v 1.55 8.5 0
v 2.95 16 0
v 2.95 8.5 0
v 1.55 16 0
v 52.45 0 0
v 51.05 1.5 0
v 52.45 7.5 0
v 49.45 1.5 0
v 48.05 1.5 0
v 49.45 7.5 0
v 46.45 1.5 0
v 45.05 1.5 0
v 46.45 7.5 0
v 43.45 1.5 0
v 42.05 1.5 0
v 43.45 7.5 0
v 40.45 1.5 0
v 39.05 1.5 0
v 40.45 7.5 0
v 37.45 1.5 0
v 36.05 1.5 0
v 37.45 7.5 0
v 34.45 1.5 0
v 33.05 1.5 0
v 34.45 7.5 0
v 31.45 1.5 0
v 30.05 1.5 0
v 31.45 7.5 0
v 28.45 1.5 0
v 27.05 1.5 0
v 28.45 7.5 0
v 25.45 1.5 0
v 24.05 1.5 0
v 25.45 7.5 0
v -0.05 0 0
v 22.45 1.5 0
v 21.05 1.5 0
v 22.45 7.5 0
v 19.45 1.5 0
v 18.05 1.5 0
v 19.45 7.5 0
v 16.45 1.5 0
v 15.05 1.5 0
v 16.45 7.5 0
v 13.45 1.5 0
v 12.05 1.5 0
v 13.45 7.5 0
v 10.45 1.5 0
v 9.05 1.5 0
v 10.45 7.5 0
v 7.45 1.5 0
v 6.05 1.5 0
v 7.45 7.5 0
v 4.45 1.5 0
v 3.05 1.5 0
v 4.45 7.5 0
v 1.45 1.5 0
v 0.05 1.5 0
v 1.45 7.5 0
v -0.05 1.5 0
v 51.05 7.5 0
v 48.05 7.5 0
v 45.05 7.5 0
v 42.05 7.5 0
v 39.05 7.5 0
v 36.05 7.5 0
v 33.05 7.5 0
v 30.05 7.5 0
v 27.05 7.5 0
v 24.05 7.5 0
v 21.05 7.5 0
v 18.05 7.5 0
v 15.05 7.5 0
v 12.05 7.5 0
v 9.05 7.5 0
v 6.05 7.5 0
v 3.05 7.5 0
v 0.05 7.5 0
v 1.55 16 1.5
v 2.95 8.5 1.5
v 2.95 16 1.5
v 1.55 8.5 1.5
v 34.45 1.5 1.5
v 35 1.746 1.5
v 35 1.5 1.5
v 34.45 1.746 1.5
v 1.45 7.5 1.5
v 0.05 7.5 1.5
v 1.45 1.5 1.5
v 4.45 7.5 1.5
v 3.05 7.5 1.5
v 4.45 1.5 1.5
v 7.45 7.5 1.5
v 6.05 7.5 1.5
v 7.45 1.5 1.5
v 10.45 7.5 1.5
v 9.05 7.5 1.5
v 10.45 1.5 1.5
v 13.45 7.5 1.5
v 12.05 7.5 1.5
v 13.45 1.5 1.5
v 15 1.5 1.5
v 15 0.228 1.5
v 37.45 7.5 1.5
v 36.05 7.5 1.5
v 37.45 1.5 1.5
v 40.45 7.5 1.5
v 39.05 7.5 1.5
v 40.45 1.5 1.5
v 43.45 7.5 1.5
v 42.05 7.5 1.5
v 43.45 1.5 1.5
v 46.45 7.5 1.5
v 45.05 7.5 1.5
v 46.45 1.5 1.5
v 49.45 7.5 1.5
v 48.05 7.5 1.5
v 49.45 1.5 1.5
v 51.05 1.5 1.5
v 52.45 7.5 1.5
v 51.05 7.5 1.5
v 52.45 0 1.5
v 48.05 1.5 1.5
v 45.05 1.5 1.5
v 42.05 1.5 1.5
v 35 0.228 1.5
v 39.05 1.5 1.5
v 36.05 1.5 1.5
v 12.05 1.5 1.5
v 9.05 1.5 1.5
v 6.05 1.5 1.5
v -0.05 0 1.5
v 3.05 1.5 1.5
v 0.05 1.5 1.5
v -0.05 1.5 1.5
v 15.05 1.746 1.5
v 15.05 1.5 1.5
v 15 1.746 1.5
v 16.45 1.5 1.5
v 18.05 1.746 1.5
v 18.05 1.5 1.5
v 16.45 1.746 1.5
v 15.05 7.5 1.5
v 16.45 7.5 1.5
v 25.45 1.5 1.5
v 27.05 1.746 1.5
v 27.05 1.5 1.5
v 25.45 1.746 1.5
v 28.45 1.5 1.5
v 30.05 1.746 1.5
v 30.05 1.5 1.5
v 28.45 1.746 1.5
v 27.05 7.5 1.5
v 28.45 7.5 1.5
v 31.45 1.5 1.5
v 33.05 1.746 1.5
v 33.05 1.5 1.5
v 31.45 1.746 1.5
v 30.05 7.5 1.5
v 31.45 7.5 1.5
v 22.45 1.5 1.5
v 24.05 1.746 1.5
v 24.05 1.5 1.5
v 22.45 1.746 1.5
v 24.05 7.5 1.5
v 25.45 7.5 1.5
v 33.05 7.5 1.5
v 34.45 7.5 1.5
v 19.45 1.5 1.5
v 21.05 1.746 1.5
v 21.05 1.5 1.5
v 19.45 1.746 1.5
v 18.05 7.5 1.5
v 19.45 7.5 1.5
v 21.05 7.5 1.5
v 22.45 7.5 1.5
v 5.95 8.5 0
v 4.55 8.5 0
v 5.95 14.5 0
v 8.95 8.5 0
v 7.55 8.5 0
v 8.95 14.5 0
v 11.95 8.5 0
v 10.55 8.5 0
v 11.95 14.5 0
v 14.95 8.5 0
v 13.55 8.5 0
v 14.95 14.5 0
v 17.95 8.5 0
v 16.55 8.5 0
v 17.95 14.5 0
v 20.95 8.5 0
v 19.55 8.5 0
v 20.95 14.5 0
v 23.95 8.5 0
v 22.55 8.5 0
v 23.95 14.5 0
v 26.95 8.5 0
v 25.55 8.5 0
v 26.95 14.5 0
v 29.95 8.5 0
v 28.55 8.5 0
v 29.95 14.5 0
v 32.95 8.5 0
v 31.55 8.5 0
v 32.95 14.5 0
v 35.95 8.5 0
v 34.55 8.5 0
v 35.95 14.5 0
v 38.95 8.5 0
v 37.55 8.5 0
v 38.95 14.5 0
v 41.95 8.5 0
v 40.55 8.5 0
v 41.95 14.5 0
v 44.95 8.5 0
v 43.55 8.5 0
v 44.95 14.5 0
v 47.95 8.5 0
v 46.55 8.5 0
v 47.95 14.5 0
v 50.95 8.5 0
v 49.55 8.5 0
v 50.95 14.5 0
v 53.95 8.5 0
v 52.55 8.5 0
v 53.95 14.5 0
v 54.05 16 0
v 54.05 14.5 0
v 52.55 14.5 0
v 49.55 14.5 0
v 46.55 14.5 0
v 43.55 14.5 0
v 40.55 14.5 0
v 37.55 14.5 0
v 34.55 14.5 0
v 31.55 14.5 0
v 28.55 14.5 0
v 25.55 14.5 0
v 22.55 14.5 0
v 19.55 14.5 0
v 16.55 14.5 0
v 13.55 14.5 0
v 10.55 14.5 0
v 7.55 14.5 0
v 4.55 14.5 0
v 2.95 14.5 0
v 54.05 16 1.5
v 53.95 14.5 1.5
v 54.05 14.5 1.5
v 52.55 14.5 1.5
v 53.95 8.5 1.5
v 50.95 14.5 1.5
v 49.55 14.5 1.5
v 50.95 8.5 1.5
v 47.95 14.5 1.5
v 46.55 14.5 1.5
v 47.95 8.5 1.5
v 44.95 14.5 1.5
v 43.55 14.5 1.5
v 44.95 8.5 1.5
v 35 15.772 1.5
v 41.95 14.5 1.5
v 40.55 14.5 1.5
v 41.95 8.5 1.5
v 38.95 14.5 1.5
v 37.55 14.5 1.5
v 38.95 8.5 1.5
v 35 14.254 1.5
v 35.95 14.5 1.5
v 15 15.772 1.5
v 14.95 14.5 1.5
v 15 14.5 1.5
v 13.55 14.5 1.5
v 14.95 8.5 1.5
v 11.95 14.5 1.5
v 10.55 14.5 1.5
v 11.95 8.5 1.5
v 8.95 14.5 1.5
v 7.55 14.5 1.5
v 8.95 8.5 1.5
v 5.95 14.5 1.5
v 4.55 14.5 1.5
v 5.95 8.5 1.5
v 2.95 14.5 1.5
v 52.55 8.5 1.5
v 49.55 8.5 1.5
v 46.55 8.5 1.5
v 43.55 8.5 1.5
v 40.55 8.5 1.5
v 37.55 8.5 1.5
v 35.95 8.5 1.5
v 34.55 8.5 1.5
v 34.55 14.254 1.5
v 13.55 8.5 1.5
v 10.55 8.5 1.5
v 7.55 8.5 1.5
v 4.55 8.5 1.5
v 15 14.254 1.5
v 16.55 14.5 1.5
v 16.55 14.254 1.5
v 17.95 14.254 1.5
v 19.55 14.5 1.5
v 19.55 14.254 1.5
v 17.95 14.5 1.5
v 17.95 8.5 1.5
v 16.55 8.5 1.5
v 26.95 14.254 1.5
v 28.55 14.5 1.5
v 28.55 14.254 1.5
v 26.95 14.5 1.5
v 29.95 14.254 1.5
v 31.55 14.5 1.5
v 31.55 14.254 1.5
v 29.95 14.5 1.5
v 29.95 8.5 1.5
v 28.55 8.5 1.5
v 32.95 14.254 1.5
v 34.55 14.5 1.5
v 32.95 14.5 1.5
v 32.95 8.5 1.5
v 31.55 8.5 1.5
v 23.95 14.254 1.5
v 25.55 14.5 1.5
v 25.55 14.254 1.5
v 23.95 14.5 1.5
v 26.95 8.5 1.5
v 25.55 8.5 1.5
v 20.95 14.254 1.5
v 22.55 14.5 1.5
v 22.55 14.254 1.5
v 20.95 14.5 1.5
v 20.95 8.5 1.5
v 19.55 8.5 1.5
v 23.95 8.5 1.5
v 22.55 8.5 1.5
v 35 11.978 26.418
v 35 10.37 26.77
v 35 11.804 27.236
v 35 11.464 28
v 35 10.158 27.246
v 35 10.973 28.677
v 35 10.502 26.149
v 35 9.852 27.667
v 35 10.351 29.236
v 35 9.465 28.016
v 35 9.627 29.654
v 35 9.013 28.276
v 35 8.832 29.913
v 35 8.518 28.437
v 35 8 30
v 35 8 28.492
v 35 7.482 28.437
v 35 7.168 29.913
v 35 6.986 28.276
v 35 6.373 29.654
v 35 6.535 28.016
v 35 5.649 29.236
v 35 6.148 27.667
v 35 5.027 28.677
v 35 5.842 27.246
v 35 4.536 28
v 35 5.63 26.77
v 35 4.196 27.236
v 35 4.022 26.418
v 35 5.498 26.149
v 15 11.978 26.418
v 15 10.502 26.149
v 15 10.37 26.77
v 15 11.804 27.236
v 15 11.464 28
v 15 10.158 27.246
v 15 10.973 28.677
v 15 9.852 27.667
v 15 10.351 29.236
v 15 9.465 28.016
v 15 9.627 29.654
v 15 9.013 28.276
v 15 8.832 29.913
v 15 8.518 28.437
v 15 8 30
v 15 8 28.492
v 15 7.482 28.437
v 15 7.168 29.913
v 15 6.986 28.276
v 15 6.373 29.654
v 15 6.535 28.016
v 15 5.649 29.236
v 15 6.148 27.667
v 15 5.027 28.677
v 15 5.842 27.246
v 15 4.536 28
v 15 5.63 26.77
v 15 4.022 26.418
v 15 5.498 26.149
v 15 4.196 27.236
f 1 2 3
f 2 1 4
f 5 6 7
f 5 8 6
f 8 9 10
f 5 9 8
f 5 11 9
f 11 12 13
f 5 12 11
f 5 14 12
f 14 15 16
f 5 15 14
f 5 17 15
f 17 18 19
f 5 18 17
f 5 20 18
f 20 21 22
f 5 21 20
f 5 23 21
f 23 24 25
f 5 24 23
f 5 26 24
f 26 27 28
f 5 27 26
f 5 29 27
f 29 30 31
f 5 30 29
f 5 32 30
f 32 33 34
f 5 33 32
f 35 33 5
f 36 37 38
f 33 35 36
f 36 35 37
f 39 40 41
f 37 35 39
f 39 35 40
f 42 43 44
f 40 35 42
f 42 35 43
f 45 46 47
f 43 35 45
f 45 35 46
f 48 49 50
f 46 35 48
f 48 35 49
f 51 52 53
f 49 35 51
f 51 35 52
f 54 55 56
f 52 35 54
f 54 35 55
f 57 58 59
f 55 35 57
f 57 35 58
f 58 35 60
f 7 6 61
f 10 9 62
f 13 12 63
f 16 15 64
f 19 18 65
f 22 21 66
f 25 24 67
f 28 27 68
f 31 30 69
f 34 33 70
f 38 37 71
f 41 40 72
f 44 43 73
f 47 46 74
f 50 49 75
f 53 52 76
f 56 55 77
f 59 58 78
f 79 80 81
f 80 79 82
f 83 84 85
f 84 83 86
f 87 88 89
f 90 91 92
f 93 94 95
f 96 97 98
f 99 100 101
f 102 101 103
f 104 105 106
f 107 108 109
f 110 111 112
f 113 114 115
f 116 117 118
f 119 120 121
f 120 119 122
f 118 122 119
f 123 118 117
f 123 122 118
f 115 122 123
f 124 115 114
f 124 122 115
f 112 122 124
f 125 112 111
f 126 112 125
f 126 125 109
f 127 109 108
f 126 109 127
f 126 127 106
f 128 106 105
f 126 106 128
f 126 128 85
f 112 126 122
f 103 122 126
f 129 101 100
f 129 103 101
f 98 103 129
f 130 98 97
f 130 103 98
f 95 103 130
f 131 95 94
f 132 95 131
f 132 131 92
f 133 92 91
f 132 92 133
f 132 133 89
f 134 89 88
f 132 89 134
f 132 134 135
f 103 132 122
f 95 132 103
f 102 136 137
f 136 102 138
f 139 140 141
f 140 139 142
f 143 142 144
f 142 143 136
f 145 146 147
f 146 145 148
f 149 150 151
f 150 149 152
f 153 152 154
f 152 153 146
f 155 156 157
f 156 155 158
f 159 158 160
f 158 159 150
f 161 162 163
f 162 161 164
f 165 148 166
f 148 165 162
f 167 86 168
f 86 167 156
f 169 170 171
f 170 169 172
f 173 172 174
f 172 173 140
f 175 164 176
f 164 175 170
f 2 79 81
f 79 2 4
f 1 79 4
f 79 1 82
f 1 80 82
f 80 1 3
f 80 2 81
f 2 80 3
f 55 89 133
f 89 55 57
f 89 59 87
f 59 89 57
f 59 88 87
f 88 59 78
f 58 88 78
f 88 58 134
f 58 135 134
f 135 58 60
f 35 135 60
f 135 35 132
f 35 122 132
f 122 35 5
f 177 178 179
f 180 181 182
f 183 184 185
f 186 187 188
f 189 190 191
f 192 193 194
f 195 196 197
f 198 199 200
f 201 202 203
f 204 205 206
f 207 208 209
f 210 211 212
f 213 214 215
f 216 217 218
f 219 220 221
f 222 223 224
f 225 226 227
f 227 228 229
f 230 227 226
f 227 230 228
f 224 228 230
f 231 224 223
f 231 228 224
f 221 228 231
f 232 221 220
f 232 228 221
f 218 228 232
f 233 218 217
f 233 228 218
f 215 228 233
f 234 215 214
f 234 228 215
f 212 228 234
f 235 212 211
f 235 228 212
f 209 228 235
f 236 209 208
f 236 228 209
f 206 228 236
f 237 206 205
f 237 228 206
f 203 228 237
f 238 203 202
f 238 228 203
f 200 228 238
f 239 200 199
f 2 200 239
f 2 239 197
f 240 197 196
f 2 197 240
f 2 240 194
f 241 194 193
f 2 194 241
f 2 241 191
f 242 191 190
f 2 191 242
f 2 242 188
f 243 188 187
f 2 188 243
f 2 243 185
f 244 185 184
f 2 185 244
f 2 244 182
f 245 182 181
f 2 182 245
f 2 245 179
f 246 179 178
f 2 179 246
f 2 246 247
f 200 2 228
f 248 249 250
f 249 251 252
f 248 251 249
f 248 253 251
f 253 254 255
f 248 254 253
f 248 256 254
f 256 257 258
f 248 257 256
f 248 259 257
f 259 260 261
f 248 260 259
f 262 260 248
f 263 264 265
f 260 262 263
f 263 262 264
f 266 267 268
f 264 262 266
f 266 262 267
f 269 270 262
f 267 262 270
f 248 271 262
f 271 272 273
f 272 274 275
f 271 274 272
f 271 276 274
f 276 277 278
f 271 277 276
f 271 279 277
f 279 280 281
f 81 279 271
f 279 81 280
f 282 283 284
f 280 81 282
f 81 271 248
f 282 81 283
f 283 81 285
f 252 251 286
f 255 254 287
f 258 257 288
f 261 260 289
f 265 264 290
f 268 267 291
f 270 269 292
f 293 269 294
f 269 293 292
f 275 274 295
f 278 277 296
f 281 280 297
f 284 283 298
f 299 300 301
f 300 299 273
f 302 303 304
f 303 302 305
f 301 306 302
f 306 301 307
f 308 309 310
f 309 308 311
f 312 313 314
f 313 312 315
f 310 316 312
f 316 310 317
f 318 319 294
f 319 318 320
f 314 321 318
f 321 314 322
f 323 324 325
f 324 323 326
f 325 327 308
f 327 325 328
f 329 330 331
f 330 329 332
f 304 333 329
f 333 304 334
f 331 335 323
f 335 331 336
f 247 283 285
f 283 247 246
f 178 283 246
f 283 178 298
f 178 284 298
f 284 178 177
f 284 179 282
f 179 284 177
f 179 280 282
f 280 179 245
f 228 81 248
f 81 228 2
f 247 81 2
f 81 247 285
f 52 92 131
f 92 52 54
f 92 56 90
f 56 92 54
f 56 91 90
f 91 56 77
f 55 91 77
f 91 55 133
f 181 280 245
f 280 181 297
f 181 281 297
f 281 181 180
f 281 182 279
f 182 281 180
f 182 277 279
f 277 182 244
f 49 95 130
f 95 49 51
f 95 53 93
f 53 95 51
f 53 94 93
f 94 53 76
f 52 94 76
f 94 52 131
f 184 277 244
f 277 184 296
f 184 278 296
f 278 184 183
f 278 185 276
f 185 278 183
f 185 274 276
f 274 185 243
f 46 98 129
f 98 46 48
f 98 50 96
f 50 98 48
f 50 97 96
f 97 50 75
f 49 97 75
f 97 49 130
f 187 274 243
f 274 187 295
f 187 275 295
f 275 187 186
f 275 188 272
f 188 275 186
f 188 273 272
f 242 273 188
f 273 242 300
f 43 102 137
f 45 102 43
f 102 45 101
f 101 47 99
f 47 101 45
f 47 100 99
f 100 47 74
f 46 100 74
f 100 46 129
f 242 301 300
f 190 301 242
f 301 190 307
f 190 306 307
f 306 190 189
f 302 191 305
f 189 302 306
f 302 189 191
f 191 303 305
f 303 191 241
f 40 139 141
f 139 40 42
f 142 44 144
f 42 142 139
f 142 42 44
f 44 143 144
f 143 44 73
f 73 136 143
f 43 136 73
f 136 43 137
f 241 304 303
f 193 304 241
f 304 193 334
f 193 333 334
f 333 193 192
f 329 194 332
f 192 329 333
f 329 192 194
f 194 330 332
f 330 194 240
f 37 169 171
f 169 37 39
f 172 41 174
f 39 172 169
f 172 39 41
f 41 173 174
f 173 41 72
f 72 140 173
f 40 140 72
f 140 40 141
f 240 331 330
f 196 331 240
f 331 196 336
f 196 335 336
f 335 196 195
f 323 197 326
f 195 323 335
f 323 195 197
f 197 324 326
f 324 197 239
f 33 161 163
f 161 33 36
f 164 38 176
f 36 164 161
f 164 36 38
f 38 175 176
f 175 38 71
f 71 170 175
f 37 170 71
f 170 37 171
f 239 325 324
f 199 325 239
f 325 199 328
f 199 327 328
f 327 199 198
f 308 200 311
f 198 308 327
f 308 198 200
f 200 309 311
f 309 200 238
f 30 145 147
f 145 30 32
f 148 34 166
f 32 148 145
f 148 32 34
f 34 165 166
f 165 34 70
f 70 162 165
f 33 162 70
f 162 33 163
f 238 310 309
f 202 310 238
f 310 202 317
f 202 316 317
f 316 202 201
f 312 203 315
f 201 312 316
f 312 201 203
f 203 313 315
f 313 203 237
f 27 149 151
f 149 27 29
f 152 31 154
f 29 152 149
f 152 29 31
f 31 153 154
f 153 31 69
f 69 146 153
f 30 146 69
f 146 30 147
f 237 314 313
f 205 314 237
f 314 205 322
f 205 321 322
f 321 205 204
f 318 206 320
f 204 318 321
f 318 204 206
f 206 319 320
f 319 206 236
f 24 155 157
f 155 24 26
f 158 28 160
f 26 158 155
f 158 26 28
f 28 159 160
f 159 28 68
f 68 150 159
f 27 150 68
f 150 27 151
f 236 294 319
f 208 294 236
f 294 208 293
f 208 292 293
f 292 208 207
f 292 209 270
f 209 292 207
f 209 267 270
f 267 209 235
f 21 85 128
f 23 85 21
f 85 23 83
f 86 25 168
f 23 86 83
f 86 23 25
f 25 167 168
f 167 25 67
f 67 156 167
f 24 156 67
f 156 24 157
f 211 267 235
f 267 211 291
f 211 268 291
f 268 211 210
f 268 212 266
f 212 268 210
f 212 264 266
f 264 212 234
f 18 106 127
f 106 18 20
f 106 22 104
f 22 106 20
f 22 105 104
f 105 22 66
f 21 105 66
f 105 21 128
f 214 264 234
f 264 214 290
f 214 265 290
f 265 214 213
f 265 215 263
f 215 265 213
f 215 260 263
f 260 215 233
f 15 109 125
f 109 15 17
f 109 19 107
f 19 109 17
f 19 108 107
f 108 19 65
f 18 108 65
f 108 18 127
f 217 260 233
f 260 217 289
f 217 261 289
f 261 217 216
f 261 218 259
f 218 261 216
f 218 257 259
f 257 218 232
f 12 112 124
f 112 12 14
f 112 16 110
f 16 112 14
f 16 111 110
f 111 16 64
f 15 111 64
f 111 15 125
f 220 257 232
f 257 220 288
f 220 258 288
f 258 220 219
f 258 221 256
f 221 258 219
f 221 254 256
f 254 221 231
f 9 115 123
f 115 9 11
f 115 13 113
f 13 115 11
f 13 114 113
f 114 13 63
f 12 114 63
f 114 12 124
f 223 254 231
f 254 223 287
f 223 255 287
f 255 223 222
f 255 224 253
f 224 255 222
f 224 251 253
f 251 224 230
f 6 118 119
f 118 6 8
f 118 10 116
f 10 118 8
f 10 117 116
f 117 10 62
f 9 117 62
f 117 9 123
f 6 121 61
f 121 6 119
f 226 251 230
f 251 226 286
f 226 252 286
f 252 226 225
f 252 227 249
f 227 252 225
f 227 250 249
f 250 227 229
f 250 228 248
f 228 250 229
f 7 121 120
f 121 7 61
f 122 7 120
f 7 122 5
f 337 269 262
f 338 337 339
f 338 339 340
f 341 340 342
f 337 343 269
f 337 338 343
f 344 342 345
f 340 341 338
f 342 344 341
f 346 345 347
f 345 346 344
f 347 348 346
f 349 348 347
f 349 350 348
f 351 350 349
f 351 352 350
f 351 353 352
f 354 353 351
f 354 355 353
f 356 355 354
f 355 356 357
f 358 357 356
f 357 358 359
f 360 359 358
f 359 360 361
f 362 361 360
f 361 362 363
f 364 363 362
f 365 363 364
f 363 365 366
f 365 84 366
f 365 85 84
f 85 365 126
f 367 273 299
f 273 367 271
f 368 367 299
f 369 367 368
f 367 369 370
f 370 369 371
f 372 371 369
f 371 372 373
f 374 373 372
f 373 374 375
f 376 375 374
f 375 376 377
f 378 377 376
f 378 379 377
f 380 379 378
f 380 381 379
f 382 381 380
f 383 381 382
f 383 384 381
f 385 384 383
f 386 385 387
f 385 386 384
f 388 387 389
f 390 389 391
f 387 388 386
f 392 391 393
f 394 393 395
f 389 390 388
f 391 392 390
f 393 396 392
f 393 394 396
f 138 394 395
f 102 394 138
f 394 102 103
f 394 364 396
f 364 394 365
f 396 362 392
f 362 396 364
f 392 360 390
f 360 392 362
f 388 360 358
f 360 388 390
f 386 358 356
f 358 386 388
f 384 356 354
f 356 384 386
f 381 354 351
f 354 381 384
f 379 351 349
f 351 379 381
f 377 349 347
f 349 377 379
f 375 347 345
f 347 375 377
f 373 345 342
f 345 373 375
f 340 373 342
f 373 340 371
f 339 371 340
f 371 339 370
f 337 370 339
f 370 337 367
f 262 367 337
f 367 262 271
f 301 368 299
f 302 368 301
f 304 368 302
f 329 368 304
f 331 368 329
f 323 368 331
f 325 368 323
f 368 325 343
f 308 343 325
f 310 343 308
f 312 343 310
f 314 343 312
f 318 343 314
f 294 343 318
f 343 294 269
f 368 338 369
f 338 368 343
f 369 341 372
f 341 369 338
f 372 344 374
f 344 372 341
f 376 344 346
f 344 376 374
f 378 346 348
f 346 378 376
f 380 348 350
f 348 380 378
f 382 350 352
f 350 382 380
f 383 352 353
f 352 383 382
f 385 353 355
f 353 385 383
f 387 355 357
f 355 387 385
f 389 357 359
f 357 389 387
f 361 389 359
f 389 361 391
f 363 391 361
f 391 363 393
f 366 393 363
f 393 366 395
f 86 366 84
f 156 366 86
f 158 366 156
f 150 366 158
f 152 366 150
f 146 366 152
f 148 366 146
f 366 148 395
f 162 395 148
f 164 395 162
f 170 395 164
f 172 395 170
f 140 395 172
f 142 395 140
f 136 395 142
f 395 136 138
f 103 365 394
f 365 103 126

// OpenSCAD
/*

    bijenbekje die zichzelf vastklemt. Vorige versie had
    wat te weinig speling, hierdoor was het bekje volledig dicht. 
    kan nu uiteraard helemaal geparametriseerd worden

*/

lengte      = 50;   // lengte bijenbekje
breedte     = 16;   // breedte bijenbekje
hoogte      = 1.5;    // hoogte grondplaat bijenbekje

pootje      = 1.5;  // breedte van een pootje 
marge       = 0.1;  // marge tussen twee pootjes (voorkomen schuren)
gap         = 1;    // ruimte tussen de twee bekjes
top         = 30;   // hoogte van de klem
bekBreedte  = 20;

/**
    TODO
    -   bij eerste en laatste steekt nog een stuk uit

**/


grondPlaat();
klem();
module grondPlaat() {
    aantal = ceil(lengte / pootje / 2);
    echo(aantal = aantal);
    union() {
        for(i=[0 : aantal]) {
            translate([pootje * 2 * i, 0,  0]) {
                single(first = i==0, last = i == aantal);
            }
        }
    }
}

//!single(last = true);
module single(first = false, last = false) {
    lengtePootje = breedte / 2 - gap / 2;
    sizePoot = [pootje - marge, lengtePootje];
    sizeVerbinding = [pootje * 2+marge, pootje];

    linear_extrude(height = hoogte) {
        translate([marge /2 , 0, 0]) {
            square(sizePoot);
        }
        translate([pootje + marge /2 , lengtePootje + gap, 0]) {
            square(sizePoot);
        }
        translate([-marge / 2, 0, 0]) {
            if (!last) {
                square(sizeVerbinding);
            }
            if (!first) {
                translate([0, breedte - pootje, 0]) {
                    square(sizeVerbinding);
                }
            }
        }
    }
}

//!klem();
module klem() {
    translate([(lengte + bekBreedte) / 2, 0, 0]) {
        rotate([0, -90, 0]) {
            linear_extrude(height = bekBreedte) {
                difference() {
                    klemBasis();
                    //translate([-pootje, 0, 0]) {
                    offset(r = -pootje) {
                        klemBasis();
                    }
                    square([pootje, breedte]);
                }
            }
        }
    }
}
module klemBasis(){
    diameter = breedte / 2;
    top = [top, breedte / 2];
    hull() {
        translate([top.x - diameter / 2   , top.y, 0]) {
            circle(d = diameter, true, $fn=30);
        }
        polygon(points = [[0, 0], [0, breedte], top]);
    }
    
}
